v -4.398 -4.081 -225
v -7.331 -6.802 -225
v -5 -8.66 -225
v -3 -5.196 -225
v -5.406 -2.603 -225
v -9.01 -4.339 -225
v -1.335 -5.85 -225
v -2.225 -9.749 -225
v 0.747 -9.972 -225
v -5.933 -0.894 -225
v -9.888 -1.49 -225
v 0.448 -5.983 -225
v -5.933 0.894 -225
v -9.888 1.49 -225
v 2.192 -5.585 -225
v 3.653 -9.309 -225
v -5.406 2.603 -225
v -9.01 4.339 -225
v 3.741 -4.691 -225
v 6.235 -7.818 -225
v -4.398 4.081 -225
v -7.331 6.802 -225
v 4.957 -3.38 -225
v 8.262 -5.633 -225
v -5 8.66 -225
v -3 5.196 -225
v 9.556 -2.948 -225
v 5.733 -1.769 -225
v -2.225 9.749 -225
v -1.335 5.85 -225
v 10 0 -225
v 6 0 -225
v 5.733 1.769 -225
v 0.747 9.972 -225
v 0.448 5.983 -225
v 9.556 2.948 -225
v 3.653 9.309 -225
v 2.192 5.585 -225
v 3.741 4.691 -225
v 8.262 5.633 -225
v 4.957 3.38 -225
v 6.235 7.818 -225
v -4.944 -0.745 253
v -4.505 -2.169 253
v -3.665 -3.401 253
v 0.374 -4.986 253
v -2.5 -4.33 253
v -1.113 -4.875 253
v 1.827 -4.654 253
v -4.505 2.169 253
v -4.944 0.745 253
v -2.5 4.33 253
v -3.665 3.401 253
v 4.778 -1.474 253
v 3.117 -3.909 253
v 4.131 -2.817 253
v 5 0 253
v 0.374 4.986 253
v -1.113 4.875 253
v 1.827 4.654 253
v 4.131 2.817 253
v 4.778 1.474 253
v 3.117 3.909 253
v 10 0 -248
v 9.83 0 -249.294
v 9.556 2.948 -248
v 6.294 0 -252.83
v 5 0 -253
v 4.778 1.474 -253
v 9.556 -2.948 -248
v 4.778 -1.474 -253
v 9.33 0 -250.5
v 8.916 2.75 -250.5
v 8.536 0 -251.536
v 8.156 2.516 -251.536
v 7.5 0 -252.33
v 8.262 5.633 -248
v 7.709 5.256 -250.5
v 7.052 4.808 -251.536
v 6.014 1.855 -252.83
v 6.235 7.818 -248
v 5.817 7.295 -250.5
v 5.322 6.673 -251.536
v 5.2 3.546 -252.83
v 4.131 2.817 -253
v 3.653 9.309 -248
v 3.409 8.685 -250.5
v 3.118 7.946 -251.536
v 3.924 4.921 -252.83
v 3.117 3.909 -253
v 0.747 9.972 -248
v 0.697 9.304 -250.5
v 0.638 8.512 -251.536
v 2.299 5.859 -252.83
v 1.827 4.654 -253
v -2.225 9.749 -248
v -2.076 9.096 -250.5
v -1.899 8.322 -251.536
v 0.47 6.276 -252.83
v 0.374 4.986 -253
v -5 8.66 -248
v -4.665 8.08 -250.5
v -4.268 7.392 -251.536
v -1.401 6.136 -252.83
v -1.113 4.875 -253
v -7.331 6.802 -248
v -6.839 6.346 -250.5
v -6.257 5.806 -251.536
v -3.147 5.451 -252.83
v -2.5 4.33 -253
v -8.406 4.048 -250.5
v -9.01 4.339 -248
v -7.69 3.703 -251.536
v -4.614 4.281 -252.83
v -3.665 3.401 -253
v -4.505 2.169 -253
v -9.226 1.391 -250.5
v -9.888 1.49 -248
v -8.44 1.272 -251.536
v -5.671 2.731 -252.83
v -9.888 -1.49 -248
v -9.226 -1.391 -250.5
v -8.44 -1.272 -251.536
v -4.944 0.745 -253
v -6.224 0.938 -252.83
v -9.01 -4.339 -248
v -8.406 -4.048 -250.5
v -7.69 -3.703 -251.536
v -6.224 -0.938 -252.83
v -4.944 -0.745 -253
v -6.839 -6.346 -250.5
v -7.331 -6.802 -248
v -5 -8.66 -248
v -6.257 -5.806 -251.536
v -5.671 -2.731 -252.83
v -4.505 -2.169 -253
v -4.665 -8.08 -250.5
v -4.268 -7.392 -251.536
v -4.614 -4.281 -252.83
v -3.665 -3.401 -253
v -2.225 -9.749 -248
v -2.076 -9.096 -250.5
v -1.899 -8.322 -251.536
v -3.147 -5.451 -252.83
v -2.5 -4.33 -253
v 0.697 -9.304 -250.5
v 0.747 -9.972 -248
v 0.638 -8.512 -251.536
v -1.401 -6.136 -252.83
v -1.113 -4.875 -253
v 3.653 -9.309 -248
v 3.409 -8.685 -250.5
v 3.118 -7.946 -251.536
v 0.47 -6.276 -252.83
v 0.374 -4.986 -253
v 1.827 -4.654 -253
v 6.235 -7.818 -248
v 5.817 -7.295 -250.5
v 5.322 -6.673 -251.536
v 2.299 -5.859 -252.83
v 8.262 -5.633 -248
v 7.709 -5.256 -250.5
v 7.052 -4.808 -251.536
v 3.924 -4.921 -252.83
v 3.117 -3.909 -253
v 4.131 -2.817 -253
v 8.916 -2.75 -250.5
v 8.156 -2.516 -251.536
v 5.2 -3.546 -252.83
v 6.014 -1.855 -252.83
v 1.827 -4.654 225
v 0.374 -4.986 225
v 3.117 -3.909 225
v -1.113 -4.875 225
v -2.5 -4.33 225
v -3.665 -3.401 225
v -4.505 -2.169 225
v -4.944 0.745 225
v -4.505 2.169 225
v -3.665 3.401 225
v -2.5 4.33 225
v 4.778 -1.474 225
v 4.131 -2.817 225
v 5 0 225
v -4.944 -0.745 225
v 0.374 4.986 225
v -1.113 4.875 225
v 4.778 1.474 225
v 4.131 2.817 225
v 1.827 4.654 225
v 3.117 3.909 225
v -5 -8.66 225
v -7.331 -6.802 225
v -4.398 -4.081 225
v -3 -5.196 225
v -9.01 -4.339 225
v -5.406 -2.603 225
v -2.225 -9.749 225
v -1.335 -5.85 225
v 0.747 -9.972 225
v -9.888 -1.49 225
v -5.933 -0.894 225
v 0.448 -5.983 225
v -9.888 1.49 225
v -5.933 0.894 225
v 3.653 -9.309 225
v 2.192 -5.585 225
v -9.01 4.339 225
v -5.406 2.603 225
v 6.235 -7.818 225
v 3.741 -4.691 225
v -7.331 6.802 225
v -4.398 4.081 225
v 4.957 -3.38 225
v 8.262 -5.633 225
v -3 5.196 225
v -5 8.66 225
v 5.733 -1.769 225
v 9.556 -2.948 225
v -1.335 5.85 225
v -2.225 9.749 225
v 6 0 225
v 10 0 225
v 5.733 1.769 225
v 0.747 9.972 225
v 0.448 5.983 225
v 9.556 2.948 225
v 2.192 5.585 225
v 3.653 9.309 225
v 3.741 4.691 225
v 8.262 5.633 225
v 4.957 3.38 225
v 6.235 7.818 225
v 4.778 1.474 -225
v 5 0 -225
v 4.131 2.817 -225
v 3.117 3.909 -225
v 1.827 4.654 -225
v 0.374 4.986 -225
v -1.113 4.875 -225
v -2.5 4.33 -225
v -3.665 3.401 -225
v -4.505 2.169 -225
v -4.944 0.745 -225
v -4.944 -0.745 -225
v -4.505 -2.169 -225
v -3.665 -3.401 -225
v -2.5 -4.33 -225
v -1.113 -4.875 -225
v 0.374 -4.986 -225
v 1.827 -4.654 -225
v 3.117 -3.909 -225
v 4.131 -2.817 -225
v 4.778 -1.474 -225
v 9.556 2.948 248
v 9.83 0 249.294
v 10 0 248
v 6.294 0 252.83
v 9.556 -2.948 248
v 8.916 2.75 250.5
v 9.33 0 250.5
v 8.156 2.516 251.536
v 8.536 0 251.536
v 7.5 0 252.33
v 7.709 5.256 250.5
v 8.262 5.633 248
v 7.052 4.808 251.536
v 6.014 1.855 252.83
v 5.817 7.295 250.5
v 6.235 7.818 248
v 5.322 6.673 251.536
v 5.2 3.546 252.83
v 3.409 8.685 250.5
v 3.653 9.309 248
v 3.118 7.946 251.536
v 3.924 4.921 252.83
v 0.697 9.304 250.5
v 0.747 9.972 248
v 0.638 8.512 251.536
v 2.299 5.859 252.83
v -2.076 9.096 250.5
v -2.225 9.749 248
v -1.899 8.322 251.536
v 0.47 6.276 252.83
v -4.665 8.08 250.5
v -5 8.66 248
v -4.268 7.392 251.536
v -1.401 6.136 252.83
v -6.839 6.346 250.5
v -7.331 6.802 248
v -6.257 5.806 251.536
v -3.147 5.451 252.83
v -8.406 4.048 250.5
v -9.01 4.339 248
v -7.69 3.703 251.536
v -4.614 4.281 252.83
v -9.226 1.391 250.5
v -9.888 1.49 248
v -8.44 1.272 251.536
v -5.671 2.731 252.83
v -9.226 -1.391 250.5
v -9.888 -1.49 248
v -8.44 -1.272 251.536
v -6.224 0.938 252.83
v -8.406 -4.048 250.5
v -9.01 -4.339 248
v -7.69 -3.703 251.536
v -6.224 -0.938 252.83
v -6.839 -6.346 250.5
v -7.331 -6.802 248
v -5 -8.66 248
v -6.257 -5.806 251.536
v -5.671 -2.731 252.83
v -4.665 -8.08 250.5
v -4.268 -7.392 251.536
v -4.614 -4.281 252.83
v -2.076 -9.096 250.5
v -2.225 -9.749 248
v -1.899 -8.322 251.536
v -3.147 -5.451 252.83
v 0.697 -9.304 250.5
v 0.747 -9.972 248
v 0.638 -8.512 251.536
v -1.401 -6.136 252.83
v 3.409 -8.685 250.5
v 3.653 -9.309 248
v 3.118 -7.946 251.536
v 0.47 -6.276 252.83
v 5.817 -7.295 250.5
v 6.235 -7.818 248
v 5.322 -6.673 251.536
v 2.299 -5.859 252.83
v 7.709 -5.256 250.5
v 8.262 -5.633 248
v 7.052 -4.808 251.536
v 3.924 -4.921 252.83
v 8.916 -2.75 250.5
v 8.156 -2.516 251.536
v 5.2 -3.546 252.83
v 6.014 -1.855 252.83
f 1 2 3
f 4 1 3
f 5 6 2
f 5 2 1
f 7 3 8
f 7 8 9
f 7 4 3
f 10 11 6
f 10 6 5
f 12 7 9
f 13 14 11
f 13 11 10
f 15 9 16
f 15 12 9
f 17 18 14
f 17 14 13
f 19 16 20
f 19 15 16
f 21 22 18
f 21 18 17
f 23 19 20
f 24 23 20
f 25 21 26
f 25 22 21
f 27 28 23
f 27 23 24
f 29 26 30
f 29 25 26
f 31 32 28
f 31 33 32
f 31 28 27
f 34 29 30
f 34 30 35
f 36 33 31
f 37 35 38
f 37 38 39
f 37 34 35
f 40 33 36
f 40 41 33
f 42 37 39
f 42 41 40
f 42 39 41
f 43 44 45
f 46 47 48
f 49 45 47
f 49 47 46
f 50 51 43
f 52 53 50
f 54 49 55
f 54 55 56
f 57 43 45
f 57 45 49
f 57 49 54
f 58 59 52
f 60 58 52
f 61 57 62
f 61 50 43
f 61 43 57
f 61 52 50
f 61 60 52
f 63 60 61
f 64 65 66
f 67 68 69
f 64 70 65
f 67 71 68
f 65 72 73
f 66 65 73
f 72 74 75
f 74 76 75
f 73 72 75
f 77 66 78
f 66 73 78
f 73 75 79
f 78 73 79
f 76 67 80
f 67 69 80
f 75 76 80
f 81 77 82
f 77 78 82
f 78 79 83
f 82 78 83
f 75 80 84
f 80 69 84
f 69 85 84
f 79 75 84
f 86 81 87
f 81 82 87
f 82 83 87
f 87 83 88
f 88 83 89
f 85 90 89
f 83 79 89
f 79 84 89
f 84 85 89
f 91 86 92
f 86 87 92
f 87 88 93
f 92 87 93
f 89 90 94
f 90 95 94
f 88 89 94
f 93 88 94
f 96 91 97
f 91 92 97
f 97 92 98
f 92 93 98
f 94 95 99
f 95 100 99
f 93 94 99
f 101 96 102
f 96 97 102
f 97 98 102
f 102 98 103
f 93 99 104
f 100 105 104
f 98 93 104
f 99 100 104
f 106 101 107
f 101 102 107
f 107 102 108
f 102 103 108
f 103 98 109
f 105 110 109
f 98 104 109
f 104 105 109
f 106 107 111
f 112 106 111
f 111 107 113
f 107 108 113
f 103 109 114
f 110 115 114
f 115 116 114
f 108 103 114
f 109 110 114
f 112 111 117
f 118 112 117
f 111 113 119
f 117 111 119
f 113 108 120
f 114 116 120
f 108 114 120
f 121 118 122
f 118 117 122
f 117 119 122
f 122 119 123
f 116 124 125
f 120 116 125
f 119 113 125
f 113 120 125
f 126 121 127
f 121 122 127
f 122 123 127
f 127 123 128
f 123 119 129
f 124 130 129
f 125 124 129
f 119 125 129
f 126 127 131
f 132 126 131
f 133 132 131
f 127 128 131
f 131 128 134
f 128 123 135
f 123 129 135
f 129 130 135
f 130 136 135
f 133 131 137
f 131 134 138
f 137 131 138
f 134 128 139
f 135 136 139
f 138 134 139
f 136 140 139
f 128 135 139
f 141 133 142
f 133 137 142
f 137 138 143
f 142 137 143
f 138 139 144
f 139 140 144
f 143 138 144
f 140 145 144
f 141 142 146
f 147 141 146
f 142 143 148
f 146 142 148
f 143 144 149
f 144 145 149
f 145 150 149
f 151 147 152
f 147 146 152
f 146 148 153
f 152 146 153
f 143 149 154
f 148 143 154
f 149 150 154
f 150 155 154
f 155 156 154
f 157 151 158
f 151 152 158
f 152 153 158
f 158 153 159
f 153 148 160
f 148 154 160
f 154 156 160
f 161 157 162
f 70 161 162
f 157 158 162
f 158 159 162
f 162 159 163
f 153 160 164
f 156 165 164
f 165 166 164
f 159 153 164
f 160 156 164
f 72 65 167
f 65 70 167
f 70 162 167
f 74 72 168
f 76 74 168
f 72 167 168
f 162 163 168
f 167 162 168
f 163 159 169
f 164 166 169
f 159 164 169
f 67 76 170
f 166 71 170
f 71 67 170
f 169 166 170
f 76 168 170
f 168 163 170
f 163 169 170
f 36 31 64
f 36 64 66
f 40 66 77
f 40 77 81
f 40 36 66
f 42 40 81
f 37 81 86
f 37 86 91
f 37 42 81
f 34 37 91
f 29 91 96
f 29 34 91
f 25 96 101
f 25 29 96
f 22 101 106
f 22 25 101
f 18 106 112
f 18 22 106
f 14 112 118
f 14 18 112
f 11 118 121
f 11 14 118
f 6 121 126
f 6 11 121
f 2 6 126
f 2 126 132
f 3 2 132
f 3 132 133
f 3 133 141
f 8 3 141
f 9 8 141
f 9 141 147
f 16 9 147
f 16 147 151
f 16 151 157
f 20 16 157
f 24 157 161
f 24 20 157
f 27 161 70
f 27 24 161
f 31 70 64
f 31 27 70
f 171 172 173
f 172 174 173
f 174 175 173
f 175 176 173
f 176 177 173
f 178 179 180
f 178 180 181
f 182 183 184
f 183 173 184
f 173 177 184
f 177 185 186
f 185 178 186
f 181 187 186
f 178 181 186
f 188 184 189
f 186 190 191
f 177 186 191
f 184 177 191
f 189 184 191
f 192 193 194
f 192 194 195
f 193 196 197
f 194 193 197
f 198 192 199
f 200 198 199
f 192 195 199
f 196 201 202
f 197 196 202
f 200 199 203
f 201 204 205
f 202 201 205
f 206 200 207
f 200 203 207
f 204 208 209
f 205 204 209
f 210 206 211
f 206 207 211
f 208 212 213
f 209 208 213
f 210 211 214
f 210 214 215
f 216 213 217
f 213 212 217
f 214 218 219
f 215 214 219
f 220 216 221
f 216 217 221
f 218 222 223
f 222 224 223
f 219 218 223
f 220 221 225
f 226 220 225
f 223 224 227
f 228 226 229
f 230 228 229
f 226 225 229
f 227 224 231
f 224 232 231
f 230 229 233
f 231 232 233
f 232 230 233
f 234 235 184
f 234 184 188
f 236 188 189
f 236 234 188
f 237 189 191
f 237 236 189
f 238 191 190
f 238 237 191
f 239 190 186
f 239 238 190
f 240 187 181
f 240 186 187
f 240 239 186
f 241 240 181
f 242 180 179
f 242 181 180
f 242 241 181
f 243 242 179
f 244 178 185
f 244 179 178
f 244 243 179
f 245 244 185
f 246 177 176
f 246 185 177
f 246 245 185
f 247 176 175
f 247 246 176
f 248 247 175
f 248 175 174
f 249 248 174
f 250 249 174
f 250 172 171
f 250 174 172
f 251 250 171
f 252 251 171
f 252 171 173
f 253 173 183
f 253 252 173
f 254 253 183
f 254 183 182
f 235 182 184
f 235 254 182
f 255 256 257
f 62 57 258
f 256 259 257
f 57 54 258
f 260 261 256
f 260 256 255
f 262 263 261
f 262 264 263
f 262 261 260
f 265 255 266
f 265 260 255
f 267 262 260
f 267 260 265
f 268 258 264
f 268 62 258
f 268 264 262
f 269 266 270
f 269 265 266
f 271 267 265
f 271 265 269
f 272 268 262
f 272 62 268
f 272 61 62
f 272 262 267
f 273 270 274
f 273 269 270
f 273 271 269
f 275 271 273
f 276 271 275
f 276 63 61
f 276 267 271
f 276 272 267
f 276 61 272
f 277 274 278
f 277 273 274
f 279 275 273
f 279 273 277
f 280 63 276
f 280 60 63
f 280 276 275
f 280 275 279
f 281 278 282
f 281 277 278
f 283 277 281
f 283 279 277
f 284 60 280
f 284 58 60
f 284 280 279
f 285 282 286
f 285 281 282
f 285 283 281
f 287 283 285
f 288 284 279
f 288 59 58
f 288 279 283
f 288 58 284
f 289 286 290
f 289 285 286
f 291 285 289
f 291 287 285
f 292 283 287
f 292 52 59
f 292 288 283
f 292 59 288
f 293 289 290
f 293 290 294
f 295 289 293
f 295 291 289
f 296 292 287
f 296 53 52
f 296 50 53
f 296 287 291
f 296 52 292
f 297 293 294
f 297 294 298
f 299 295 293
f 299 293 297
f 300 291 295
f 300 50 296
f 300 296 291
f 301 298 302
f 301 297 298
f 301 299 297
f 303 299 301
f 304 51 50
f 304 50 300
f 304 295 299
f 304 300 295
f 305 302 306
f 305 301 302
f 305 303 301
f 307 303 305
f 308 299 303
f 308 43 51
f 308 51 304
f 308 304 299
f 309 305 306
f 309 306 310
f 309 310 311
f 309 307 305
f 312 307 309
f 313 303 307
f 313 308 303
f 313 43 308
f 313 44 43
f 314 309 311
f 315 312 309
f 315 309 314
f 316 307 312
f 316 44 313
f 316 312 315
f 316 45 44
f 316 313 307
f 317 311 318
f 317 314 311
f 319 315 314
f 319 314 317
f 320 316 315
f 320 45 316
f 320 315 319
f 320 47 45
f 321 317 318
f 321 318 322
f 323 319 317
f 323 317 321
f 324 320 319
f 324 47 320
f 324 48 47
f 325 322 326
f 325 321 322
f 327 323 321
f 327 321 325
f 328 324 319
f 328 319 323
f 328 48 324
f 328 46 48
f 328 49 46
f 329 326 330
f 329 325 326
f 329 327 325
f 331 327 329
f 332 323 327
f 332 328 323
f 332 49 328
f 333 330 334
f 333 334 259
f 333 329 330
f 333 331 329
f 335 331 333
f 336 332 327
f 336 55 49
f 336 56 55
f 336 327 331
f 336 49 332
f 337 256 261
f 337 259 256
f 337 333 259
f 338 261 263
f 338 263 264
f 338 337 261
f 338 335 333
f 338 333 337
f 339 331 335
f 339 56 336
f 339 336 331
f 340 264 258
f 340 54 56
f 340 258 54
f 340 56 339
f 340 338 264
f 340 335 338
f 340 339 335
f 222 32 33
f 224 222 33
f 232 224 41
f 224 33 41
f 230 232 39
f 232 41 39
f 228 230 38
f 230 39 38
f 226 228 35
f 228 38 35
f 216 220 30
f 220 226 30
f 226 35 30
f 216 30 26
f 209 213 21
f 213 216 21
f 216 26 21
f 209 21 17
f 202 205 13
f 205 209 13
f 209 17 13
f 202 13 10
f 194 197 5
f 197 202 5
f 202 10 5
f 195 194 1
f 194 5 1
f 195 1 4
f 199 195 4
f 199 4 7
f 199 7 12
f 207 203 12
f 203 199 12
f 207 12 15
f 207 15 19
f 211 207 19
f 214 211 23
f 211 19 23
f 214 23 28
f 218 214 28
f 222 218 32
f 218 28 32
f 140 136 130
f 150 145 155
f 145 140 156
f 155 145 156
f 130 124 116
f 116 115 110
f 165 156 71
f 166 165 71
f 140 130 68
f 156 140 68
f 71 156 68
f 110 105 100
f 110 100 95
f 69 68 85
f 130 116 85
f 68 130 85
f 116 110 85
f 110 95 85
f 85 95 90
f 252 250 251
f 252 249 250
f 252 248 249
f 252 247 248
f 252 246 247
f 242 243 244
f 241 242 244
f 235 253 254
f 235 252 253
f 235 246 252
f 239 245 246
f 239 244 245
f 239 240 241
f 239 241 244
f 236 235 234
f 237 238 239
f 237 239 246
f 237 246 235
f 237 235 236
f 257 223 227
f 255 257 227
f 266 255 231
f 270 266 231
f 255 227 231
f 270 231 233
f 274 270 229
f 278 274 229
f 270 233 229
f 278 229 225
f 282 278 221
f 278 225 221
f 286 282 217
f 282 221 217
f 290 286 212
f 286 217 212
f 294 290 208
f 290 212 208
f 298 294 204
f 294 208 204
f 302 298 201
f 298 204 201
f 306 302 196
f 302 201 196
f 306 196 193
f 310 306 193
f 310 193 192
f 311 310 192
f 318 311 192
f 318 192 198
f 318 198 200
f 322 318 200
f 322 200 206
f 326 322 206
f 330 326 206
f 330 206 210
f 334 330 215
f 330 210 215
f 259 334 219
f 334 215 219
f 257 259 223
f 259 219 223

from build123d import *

# Parameters (mm, degrees)
BOSS_EXTRUDE1_DEPTH      = 250
BOSS_EXTRUDE1_DEPTH_BACK = 250
SKETCH1_R                = 6
SKETCH1_R_2              = 5
BOSS_EXTRUDE2_START      = -25
SKETCH2_R                = 10
BOSS_EXTRUDE2_DEPTH      = 28
FILLET1_R                = 5
FILLET2_R                = 5


with BuildPart() as part:
    # Sketch1 → Boss-Extrude1 (new, two sides: drawn at the far end of the back side and taken through both)
    with BuildSketch(Plane.XY.offset(-BOSS_EXTRUDE1_DEPTH_BACK)):
        Circle(SKETCH1_R)
        Circle(SKETCH1_R_2, mode=Mode.SUBTRACT)
    extrude(amount=BOSS_EXTRUDE1_DEPTH + BOSS_EXTRUDE1_DEPTH_BACK)

    # Sketch2 → Boss-Extrude2 (add)
    with BuildSketch(Plane.XY.offset(250).offset(BOSS_EXTRUDE2_START)):
        Circle(SKETCH2_R)
    boss_extrude2 = extrude(amount=BOSS_EXTRUDE2_DEPTH)

    # Fillet1
    fillet1_edges = [part.edges().sort_by_distance(p)[0] for p in [
        (-10, 0, 253),
    ]]
    fillet(fillet1_edges, radius=FILLET1_R)

    # Mirror2: Boss-Extrude2 across plane
    add(boss_extrude2.mirror(Plane.XY))

    # Fillet2
    fillet2_edges = [part.edges().sort_by_distance(p)[0] for p in [
        (-10, 0, -253),
    ]]
    fillet(fillet2_edges, radius=FILLET2_R)


solid = part.part
